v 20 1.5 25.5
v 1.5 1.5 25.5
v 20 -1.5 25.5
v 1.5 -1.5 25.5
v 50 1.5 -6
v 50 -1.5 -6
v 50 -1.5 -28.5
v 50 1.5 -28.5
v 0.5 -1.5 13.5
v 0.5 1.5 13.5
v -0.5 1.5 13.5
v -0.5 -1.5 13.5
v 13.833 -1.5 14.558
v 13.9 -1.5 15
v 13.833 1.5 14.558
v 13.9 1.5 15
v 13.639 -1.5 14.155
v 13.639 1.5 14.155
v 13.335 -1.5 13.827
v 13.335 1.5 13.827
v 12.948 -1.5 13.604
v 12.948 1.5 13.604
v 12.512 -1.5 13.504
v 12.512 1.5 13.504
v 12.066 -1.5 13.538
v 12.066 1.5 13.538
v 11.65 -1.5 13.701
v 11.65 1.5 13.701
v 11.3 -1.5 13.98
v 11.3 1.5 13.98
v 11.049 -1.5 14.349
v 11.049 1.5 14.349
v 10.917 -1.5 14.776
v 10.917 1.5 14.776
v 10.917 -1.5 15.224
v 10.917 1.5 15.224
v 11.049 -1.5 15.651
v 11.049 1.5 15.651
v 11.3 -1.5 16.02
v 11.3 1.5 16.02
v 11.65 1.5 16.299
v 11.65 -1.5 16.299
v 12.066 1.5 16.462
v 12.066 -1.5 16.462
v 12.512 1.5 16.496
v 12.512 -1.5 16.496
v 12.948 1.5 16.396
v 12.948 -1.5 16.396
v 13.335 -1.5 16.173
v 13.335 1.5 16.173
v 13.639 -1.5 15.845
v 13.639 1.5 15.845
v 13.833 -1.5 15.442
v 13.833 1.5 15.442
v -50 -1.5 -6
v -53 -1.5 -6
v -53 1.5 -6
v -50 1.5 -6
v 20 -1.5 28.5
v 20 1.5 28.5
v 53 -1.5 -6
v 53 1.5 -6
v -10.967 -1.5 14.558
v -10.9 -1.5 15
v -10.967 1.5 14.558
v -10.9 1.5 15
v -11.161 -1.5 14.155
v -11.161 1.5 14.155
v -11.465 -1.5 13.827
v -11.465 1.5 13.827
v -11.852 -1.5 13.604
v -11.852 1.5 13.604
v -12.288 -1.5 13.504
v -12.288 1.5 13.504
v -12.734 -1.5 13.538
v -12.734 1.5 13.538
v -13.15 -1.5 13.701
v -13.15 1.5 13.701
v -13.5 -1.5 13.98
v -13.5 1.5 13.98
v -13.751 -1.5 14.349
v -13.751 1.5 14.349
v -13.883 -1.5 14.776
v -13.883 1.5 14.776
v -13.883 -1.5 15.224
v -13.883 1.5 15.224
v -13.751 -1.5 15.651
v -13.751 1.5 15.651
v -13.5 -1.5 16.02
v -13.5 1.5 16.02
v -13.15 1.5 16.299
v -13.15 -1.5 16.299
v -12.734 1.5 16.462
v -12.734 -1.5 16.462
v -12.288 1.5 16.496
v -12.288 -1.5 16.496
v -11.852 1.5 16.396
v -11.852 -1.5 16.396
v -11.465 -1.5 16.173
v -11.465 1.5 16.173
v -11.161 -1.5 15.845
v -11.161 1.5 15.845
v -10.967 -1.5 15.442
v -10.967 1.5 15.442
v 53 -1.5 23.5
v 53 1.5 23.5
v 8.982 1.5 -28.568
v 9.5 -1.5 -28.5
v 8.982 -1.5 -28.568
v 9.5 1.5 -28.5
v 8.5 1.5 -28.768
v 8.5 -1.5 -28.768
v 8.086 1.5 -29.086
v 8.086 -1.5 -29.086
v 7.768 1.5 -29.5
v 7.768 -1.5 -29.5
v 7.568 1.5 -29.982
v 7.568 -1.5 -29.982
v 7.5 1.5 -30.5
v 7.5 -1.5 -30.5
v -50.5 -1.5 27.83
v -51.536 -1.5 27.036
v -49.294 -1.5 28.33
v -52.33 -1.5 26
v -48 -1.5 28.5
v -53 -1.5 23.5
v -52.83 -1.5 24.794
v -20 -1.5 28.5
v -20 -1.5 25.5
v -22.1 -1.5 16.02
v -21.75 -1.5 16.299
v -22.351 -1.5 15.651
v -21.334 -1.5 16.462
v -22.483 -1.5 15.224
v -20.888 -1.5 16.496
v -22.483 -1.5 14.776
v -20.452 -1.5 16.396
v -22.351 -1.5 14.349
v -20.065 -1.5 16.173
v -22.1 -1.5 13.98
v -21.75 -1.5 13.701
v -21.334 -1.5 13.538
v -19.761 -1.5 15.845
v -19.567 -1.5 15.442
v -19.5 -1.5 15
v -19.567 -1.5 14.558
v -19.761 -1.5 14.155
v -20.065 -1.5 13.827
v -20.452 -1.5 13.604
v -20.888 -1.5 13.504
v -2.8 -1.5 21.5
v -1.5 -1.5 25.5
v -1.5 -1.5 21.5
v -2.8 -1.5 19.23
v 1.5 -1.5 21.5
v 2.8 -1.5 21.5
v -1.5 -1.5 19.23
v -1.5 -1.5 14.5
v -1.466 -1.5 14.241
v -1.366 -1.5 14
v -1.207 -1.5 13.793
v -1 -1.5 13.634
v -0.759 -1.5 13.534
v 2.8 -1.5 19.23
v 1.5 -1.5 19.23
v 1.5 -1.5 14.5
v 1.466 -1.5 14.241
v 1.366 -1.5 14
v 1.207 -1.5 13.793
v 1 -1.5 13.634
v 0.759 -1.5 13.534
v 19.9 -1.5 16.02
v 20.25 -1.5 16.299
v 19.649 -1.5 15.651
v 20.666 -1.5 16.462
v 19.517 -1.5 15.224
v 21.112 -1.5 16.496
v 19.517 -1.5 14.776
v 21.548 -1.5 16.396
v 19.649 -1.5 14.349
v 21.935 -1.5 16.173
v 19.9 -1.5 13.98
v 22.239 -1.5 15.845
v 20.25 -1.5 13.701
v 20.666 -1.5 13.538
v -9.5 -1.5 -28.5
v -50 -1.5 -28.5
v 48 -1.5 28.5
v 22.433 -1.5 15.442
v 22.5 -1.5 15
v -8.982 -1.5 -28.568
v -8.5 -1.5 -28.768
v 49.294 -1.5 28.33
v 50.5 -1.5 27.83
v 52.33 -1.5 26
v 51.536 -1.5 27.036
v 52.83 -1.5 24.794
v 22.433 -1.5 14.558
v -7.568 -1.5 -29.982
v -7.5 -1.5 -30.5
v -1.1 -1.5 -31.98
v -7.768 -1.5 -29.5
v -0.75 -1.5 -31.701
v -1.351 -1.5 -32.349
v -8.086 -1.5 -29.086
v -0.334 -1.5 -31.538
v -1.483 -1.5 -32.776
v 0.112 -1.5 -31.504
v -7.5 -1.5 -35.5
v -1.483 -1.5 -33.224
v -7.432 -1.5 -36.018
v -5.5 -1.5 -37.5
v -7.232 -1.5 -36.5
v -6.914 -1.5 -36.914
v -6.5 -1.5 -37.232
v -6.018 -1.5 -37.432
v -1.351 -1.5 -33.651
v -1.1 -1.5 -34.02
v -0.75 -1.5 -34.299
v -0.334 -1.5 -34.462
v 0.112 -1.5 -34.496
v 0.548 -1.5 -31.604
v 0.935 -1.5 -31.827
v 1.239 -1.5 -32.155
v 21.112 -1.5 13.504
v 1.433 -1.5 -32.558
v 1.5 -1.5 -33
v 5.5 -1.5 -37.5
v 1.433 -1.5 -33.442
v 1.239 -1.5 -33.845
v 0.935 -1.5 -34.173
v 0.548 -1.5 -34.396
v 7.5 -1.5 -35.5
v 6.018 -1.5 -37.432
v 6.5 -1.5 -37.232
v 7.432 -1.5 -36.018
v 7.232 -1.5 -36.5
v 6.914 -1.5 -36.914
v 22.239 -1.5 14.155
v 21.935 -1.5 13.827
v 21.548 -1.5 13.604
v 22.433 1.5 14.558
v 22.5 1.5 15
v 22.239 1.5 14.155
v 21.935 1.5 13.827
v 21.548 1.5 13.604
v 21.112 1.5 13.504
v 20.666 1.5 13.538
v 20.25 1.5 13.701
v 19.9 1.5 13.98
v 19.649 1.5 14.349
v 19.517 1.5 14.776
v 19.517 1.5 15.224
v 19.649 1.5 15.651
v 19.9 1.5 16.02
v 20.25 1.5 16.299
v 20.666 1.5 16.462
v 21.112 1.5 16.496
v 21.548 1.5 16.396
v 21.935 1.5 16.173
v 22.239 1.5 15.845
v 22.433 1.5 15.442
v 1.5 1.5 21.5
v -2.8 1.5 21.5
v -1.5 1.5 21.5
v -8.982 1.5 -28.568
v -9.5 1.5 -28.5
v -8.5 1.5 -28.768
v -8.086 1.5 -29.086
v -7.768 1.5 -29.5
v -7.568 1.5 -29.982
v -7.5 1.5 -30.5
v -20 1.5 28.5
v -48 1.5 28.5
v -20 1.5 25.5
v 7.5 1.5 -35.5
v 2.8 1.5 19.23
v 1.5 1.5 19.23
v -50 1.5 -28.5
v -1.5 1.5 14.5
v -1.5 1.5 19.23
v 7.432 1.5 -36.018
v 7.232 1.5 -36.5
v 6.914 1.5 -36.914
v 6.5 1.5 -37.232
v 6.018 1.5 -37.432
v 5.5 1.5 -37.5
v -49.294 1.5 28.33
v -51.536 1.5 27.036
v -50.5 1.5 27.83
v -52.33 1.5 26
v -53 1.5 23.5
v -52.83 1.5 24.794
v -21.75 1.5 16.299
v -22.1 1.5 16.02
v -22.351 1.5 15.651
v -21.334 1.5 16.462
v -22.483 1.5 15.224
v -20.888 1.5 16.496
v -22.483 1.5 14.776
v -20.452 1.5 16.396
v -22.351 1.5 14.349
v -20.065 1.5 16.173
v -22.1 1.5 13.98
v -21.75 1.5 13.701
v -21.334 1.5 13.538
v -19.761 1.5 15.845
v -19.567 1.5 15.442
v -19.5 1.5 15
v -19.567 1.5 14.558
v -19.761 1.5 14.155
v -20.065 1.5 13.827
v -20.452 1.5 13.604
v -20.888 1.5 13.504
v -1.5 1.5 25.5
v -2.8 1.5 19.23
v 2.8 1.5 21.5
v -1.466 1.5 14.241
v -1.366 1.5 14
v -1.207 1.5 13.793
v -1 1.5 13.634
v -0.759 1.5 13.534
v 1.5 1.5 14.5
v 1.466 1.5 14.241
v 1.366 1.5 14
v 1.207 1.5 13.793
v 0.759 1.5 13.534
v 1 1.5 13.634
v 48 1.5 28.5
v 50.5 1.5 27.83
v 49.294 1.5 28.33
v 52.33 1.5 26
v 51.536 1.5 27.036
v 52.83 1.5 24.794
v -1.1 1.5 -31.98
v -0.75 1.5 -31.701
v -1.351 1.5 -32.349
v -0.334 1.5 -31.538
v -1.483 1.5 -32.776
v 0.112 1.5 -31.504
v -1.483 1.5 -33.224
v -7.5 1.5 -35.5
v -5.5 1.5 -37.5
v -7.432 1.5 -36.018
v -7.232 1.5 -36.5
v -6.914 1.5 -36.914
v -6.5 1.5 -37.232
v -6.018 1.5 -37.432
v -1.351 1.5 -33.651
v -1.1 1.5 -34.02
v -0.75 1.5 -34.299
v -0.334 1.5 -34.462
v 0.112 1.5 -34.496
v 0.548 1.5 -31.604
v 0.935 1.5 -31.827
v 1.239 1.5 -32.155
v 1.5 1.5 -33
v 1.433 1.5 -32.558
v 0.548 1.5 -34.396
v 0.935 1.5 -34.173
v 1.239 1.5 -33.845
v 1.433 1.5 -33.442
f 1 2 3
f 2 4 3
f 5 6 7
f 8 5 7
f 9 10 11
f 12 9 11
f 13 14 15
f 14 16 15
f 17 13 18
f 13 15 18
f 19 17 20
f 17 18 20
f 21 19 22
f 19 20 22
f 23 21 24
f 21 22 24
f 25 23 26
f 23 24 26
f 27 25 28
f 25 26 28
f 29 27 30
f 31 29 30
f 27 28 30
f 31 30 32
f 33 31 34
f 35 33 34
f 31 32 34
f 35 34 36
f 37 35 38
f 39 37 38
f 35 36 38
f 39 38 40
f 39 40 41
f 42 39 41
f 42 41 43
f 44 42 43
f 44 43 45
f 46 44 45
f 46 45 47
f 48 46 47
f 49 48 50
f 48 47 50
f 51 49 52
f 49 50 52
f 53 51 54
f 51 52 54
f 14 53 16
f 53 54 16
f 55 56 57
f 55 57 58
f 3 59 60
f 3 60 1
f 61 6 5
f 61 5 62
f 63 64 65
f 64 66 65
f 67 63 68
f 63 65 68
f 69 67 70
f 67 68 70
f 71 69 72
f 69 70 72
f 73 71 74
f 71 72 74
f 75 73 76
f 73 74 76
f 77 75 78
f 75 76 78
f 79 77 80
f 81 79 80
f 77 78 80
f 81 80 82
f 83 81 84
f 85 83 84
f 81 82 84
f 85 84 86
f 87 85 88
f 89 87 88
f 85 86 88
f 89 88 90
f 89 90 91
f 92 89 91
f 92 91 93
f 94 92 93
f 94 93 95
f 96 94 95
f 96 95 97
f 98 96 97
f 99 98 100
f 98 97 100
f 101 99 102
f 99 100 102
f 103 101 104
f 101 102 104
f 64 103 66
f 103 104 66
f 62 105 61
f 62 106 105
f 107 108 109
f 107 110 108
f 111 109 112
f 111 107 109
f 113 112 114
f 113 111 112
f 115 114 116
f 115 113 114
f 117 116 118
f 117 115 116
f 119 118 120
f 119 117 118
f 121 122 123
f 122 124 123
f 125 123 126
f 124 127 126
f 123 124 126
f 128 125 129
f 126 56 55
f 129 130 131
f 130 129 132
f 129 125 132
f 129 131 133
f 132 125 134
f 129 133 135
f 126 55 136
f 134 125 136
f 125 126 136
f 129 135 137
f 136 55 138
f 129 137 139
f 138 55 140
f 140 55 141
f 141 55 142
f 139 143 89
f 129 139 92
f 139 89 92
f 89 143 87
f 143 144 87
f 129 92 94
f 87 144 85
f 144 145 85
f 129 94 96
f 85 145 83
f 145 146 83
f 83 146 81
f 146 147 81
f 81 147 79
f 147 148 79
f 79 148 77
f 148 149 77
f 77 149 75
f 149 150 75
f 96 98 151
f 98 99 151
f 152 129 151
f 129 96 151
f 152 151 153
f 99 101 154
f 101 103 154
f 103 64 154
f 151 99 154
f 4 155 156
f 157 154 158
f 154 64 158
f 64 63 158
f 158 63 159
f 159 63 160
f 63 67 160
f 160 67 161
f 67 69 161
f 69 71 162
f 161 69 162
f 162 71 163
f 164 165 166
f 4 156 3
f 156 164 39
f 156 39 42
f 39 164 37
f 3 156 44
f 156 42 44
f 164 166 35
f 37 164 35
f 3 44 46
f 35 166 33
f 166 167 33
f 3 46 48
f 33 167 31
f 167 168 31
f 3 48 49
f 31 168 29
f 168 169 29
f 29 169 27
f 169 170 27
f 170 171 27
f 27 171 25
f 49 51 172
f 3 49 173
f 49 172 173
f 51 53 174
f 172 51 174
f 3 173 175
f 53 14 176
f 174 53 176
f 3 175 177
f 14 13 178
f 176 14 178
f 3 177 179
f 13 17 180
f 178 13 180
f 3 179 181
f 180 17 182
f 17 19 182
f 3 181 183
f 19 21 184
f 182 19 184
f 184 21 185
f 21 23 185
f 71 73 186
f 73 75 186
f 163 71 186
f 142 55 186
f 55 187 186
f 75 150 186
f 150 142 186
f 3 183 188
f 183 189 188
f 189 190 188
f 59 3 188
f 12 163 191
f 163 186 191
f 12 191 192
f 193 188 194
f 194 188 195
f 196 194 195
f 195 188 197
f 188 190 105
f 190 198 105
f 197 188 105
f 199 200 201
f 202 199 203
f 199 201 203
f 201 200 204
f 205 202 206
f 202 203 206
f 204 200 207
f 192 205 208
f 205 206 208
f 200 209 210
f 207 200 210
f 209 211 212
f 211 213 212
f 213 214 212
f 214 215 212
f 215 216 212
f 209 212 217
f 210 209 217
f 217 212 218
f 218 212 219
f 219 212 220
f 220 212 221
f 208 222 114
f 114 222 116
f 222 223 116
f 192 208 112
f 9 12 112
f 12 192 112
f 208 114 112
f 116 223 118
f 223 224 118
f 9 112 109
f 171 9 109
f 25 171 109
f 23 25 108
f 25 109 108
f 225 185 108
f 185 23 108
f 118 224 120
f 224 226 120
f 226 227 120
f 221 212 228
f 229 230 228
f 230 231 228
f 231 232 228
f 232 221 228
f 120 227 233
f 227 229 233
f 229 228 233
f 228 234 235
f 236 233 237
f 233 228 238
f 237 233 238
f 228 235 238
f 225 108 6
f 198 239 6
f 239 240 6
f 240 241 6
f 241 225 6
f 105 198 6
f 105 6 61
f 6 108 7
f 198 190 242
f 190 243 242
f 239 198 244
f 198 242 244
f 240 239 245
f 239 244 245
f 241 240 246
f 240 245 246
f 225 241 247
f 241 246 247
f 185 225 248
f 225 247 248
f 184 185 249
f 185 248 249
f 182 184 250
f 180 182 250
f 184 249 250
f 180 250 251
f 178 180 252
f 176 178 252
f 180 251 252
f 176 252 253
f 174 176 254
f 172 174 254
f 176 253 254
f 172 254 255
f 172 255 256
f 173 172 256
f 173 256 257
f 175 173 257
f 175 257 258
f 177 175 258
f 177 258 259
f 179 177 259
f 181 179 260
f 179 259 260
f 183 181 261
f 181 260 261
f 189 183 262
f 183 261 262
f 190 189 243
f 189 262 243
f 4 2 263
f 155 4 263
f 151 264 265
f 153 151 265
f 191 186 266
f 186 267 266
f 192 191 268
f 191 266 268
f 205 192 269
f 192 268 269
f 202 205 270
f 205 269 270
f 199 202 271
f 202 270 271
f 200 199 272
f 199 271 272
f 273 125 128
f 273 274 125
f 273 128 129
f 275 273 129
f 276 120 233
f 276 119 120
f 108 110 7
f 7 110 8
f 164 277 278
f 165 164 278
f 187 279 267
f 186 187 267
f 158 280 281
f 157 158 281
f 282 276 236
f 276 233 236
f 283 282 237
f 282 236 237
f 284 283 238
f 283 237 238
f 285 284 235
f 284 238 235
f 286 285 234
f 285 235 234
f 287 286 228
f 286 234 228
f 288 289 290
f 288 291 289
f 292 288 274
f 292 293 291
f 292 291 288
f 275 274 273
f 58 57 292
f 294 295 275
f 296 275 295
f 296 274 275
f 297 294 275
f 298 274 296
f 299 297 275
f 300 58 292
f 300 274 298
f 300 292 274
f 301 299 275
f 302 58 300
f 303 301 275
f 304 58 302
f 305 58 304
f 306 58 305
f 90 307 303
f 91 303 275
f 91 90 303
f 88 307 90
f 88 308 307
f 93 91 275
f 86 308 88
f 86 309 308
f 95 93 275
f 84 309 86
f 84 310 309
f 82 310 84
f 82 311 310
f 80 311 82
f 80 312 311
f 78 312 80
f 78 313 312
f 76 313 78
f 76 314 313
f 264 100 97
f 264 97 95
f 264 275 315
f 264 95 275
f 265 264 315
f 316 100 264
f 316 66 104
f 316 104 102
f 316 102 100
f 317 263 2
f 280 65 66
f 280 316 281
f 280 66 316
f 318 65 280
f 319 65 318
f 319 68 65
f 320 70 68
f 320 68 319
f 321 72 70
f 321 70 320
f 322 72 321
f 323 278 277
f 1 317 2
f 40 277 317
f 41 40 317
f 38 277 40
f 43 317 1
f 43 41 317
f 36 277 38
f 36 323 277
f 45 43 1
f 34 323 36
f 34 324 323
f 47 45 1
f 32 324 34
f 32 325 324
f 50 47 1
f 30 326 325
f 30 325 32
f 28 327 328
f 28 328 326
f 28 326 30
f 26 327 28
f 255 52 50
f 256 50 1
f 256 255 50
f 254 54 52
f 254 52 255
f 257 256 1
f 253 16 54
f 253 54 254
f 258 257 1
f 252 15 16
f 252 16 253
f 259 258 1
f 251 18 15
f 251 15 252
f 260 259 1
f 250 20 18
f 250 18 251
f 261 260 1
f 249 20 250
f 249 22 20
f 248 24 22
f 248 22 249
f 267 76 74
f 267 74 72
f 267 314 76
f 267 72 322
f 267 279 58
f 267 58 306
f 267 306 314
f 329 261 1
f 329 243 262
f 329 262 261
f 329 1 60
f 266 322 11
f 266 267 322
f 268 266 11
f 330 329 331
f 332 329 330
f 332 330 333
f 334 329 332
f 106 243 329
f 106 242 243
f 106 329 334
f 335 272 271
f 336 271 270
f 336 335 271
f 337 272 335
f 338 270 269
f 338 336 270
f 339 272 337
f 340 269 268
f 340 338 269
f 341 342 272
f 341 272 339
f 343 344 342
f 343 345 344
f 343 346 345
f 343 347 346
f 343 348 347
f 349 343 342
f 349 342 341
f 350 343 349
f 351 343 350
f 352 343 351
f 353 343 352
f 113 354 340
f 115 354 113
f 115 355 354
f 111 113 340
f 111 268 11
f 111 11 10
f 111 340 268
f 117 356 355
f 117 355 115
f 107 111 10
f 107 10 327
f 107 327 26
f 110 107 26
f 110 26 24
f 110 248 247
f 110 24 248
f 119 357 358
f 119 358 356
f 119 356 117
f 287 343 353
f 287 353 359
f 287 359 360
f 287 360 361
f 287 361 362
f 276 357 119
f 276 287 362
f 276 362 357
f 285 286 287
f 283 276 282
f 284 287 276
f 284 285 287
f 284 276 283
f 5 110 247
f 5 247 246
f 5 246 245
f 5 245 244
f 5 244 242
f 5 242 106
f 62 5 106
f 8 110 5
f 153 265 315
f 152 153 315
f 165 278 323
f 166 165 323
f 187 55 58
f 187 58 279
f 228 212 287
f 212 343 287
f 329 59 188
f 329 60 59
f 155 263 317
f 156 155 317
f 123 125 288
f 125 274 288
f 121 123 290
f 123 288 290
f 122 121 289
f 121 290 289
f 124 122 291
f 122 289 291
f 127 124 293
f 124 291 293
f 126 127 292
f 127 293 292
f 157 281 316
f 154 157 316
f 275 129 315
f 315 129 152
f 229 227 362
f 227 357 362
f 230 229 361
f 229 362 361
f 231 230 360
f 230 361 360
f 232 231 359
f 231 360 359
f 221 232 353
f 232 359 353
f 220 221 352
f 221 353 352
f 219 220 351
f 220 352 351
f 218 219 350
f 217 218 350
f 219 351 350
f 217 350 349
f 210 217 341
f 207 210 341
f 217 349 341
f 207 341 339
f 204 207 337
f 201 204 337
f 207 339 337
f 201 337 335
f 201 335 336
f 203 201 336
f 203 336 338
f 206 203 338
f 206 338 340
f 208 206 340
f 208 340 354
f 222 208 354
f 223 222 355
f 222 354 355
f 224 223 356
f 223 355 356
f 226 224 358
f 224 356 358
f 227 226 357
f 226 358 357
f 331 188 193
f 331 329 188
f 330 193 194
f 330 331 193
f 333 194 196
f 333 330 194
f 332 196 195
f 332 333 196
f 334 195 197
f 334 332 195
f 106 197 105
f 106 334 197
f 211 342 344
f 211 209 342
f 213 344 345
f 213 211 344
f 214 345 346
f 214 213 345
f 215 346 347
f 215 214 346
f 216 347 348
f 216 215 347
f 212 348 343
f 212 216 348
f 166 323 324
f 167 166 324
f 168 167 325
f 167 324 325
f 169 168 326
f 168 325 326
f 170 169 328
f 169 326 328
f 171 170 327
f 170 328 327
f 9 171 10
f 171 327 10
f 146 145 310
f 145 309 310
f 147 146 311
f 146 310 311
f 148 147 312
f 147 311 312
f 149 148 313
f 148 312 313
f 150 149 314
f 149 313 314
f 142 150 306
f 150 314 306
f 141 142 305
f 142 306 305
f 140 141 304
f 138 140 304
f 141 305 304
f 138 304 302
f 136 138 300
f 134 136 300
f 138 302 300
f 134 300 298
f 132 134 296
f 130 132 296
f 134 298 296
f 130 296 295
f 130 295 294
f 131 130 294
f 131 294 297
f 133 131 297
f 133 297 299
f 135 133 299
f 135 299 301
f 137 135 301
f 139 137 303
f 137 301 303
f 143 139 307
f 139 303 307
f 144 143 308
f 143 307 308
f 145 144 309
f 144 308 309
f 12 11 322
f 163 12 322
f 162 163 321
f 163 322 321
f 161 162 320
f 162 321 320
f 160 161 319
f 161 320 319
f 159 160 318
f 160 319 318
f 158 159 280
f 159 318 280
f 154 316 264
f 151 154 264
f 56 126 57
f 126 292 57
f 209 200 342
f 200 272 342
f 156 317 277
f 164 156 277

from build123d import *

# Parameters (mm, degrees)
SKETCH1_W               = 106
SKETCH1_H               = 57
BOSS_EXTRUDE1_DEPTH     = 1.5
SKETCH2_W               = 3
SKETCH2_H               = 22.5
SKETCH2_W_2             = 40
SKETCH2_H_2             = 3
CUT_EXTRUDE1_DEPTH      = 2.5
CUT_EXTRUDE1_DEPTH_BACK = 2.5
SKETCH4_W               = 15
SKETCH4_H               = 9
BOSS_EXTRUDE2_DEPTH     = 1.5
FILLET1_R               = 2
CUT_EXTRUDE2_DEPTH      = 2.5
CUT_EXTRUDE2_DEPTH_BACK = 2.5
SKETCH5_R               = 1.5
CUT_EXTRUDE3_DEPTH      = 2.5
CUT_EXTRUDE3_DEPTH_BACK = 2.5
FILLET2_R               = 5
SKETCH6_R               = 1.5
CUT_EXTRUDE4_DEPTH      = 2.5
CUT_EXTRUDE4_DEPTH_BACK = 2.5


with BuildPart() as part:
    # Sketch1 → Boss-Extrude1 (new body, symmetric)
    with BuildSketch(Plane(origin=(0, 0, 0), x_dir=(1, 0, 0), z_dir=(0, 1, 0))):
        Rectangle(SKETCH1_W, SKETCH1_H)
    extrude(amount=BOSS_EXTRUDE1_DEPTH, both=True)

    # Sketch2 → Cut-Extrude1 (cut, two sides)
    with BuildSketch(Plane(origin=(0, 0, 0), x_dir=(1, 0, 0), z_dir=(0, 1, 0))) as cut_extrude1_sk:
        with Locations((-51.5, 17.25)):
            Rectangle(SKETCH2_W, SKETCH2_H)
        with Locations((51.5, 17.25)):
            Rectangle(SKETCH2_W, SKETCH2_H)
        with Locations((0, -27)):
            Rectangle(SKETCH2_W_2, SKETCH2_H_2)
    extrude(amount=CUT_EXTRUDE1_DEPTH, mode=Mode.SUBTRACT)
    extrude(cut_extrude1_sk.sketch, amount=-CUT_EXTRUDE1_DEPTH_BACK, mode=Mode.SUBTRACT)

    # Sketch4 → Boss-Extrude2 (add, symmetric)
    with BuildSketch(Plane(origin=(0, 0, 0), x_dir=(1, 0, 0), z_dir=(0, 1, 0))):
        with Locations((0, 33)):
            Rectangle(SKETCH4_W, SKETCH4_H)
    extrude(amount=BOSS_EXTRUDE2_DEPTH, both=True)

    # Fillet1
    fillet1_edges = [part.edges().sort_by_distance(p)[0] for p in [
        (-7.5, 0, -37.5),
        (-7.5, 0, -28.5),
        (7.5, 0, -28.5),
        (7.5, 0, -37.5),
    ]]
    fillet(fillet1_edges, radius=FILLET1_R)

    # Sketch3 → Cut-Extrude2 (cut, two sides)
    with BuildSketch(Plane(origin=(0, 0, 0), x_dir=(1, 0, 0), z_dir=(0, 1, 0))) as cut_extrude2_sk:
        with BuildLine():
            Line((-1.5, -25.5), (1.5, -25.5))
            Line((1.5, -25.5), (1.5, -21.5))
            Line((1.5, -21.5), (2.8, -21.5))
            Line((2.8, -21.5), (2.8, -19.23))
            Line((2.8, -19.23), (1.5, -19.23))
            Line((1.5, -19.23), (1.5, -14.5))
            ThreePointArc((1.5, -14.5), (1.207106781, -13.792893219), (0.5, -13.5))
            Line((0.5, -13.5), (-0.5, -13.5))
            ThreePointArc((-0.5, -13.5), (-1.207106781, -13.792893219), (-1.5, -14.5))
            Line((-1.5, -14.5), (-1.5, -19.23))
            Line((-1.5, -19.23), (-2.8, -19.23))
            Line((-2.8, -19.23), (-2.8, -21.5))
            Line((-2.8, -21.5), (-1.5, -21.5))
            Line((-1.5, -21.5), (-1.5, -25.5))
        make_face()
    extrude(amount=CUT_EXTRUDE2_DEPTH, mode=Mode.SUBTRACT)
    extrude(cut_extrude2_sk.sketch, amount=-CUT_EXTRUDE2_DEPTH_BACK, mode=Mode.SUBTRACT)

    # Sketch5 → Cut-Extrude3 (cut, two sides)
    with BuildSketch(Plane(origin=(0, 0, 0), x_dir=(1, 0, 0), z_dir=(0, 1, 0))) as cut_extrude3_sk:
        with Locations((0, 33)):
            Circle(SKETCH5_R)
    extrude(amount=CUT_EXTRUDE3_DEPTH, mode=Mode.SUBTRACT)
    extrude(cut_extrude3_sk.sketch, amount=-CUT_EXTRUDE3_DEPTH_BACK, mode=Mode.SUBTRACT)

    # Fillet2
    fillet2_edges = [part.edges().sort_by_distance(p)[0] for p in [
        (53, 0, 28.5),
        (-53, 0, 28.5),
    ]]
    fillet(fillet2_edges, radius=FILLET2_R)

    # Sketch6 → Cut-Extrude4 (cut, two sides)
    with BuildSketch(Plane(origin=(0, 0, 0), x_dir=(1, 0, 0), z_dir=(0, 1, 0))) as cut_extrude4_sk:
        with Locations((-21, -15)):
            Circle(SKETCH6_R)
        with Locations((-12.4, -15)):
            Circle(SKETCH6_R)
        with Locations((12.4, -15)):
            Circle(SKETCH6_R)
        with Locations((21, -15)):
            Circle(SKETCH6_R)
    extrude(amount=CUT_EXTRUDE4_DEPTH, mode=Mode.SUBTRACT)
    extrude(cut_extrude4_sk.sketch, amount=-CUT_EXTRUDE4_DEPTH_BACK, mode=Mode.SUBTRACT)


solid = part.part
